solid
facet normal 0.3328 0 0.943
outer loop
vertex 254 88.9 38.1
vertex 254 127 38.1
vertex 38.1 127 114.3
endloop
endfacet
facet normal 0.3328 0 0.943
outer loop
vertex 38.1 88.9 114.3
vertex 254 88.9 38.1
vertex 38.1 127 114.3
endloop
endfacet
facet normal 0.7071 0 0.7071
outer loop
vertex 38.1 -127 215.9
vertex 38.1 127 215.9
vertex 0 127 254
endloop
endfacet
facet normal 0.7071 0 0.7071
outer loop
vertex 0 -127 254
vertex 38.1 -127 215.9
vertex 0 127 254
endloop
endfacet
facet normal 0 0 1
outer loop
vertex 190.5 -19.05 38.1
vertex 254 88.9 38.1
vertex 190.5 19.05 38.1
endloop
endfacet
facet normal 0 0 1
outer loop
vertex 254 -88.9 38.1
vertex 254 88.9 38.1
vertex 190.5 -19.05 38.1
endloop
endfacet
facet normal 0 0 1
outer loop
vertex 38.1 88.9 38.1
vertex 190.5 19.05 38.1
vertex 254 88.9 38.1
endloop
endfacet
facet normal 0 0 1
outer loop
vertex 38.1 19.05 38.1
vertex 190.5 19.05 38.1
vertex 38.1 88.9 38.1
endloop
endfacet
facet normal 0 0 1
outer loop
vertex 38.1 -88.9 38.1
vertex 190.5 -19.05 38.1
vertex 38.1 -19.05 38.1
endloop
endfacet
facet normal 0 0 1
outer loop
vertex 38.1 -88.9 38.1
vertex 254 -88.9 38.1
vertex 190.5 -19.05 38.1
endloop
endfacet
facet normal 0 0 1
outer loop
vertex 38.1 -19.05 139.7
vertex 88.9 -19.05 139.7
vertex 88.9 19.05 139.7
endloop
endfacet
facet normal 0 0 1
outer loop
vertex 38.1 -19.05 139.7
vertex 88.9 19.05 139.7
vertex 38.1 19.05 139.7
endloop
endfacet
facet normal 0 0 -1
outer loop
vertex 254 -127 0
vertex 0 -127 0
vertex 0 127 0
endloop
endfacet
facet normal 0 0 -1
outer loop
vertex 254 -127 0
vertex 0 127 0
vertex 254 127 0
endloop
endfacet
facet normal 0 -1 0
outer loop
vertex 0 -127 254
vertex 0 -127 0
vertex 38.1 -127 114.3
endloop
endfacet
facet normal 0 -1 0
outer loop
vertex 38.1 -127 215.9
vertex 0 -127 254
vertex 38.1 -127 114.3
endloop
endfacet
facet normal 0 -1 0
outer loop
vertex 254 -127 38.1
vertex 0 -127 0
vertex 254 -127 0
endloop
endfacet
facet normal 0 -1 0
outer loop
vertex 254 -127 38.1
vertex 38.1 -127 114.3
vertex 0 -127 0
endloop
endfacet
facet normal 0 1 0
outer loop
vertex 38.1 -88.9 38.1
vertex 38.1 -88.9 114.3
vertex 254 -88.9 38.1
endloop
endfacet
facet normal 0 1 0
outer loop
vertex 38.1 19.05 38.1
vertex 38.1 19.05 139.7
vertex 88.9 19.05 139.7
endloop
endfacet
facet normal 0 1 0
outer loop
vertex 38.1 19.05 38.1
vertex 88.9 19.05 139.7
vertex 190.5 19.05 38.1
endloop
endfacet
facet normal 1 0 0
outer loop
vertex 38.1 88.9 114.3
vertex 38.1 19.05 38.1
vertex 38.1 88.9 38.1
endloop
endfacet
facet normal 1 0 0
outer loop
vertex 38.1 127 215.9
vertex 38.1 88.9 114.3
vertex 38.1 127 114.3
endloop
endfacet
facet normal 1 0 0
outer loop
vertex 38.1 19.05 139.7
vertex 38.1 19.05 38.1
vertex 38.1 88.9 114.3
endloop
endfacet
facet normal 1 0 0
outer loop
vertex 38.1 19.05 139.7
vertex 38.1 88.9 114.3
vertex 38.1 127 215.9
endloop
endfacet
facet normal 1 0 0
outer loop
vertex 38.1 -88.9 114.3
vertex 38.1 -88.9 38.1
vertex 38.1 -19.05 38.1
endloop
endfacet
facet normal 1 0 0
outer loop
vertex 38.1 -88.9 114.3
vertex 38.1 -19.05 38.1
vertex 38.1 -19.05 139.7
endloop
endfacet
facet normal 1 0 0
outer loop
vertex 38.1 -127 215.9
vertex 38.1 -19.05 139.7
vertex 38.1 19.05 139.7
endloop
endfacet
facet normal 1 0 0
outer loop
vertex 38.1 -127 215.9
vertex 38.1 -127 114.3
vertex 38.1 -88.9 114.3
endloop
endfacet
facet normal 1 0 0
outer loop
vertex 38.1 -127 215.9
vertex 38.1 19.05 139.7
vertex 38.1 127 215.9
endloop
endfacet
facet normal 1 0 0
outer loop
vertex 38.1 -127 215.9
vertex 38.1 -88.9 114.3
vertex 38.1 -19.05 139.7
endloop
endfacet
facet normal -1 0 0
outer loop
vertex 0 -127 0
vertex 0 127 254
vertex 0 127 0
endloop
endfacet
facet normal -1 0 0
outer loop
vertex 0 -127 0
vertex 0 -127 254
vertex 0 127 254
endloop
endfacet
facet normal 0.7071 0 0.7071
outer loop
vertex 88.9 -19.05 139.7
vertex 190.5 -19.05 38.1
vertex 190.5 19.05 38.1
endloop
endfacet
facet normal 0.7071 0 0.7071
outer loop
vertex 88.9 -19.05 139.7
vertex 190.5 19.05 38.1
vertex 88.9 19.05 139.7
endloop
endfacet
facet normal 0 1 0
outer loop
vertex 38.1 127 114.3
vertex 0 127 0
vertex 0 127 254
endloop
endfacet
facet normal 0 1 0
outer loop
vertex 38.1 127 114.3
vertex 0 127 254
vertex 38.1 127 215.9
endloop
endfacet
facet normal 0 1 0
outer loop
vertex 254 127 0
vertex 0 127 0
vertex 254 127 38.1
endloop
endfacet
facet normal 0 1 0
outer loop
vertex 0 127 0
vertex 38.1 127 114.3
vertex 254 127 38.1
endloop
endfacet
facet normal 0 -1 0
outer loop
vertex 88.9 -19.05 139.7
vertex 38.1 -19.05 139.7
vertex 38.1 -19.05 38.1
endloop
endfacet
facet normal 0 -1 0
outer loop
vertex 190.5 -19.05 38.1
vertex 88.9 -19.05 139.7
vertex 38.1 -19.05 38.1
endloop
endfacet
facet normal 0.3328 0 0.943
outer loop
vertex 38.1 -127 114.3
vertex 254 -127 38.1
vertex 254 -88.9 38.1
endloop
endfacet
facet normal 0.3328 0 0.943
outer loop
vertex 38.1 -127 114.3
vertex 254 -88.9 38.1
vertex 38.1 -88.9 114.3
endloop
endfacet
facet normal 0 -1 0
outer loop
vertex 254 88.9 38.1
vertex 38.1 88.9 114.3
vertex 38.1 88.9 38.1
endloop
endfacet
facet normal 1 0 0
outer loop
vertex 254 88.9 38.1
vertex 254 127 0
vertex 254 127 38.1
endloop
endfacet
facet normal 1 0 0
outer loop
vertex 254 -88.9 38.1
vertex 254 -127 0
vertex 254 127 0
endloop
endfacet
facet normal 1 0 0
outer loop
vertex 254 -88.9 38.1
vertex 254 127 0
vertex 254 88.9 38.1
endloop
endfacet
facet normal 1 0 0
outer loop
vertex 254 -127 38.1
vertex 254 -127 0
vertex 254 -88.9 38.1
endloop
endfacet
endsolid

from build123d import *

# Parameters (mm, degrees)
F1_DEPTH = 127
F2_DEPTH = 19.05
F4_DEPTH = 38.1


# Not quite as in the source:
# - a pattern or mirror of a feature is missing from the dataset's text; its kind, count and spacing are read off the source's solid


with BuildPart() as f1:
    # F0 (on Front) → F1 (new body, symmetric)
    with BuildSketch(Plane.XZ):
        Polygon((0, 254), (0, 0), (254, 0), (254, 38.1), (190.5, 38.1), (38.1, 38.1), (38.1, 139.7), (38.1, 215.9), align=None)
    extrude(amount=F1_DEPTH, both=True)

    # F0 (on Front) → F2 (join, symmetric)
    with BuildSketch(Plane.XZ):
        Polygon((38.1, 38.1), (190.5, 38.1), (88.9, 139.7), (38.1, 139.7), align=None)
    extrude(amount=F2_DEPTH, both=True)

    # F3 (on face) → F4 (join)
    with BuildSketch(Plane.XZ.offset(127)):
        Polygon((254, 38.1), (38.1, 114.3), (38.1, 38.1), align=None)
    f4 = extrude(amount=-F4_DEPTH)

    # F4_copies: F4 across plane
    add(f4.mirror(Plane.ZX))


solid = f1.part
